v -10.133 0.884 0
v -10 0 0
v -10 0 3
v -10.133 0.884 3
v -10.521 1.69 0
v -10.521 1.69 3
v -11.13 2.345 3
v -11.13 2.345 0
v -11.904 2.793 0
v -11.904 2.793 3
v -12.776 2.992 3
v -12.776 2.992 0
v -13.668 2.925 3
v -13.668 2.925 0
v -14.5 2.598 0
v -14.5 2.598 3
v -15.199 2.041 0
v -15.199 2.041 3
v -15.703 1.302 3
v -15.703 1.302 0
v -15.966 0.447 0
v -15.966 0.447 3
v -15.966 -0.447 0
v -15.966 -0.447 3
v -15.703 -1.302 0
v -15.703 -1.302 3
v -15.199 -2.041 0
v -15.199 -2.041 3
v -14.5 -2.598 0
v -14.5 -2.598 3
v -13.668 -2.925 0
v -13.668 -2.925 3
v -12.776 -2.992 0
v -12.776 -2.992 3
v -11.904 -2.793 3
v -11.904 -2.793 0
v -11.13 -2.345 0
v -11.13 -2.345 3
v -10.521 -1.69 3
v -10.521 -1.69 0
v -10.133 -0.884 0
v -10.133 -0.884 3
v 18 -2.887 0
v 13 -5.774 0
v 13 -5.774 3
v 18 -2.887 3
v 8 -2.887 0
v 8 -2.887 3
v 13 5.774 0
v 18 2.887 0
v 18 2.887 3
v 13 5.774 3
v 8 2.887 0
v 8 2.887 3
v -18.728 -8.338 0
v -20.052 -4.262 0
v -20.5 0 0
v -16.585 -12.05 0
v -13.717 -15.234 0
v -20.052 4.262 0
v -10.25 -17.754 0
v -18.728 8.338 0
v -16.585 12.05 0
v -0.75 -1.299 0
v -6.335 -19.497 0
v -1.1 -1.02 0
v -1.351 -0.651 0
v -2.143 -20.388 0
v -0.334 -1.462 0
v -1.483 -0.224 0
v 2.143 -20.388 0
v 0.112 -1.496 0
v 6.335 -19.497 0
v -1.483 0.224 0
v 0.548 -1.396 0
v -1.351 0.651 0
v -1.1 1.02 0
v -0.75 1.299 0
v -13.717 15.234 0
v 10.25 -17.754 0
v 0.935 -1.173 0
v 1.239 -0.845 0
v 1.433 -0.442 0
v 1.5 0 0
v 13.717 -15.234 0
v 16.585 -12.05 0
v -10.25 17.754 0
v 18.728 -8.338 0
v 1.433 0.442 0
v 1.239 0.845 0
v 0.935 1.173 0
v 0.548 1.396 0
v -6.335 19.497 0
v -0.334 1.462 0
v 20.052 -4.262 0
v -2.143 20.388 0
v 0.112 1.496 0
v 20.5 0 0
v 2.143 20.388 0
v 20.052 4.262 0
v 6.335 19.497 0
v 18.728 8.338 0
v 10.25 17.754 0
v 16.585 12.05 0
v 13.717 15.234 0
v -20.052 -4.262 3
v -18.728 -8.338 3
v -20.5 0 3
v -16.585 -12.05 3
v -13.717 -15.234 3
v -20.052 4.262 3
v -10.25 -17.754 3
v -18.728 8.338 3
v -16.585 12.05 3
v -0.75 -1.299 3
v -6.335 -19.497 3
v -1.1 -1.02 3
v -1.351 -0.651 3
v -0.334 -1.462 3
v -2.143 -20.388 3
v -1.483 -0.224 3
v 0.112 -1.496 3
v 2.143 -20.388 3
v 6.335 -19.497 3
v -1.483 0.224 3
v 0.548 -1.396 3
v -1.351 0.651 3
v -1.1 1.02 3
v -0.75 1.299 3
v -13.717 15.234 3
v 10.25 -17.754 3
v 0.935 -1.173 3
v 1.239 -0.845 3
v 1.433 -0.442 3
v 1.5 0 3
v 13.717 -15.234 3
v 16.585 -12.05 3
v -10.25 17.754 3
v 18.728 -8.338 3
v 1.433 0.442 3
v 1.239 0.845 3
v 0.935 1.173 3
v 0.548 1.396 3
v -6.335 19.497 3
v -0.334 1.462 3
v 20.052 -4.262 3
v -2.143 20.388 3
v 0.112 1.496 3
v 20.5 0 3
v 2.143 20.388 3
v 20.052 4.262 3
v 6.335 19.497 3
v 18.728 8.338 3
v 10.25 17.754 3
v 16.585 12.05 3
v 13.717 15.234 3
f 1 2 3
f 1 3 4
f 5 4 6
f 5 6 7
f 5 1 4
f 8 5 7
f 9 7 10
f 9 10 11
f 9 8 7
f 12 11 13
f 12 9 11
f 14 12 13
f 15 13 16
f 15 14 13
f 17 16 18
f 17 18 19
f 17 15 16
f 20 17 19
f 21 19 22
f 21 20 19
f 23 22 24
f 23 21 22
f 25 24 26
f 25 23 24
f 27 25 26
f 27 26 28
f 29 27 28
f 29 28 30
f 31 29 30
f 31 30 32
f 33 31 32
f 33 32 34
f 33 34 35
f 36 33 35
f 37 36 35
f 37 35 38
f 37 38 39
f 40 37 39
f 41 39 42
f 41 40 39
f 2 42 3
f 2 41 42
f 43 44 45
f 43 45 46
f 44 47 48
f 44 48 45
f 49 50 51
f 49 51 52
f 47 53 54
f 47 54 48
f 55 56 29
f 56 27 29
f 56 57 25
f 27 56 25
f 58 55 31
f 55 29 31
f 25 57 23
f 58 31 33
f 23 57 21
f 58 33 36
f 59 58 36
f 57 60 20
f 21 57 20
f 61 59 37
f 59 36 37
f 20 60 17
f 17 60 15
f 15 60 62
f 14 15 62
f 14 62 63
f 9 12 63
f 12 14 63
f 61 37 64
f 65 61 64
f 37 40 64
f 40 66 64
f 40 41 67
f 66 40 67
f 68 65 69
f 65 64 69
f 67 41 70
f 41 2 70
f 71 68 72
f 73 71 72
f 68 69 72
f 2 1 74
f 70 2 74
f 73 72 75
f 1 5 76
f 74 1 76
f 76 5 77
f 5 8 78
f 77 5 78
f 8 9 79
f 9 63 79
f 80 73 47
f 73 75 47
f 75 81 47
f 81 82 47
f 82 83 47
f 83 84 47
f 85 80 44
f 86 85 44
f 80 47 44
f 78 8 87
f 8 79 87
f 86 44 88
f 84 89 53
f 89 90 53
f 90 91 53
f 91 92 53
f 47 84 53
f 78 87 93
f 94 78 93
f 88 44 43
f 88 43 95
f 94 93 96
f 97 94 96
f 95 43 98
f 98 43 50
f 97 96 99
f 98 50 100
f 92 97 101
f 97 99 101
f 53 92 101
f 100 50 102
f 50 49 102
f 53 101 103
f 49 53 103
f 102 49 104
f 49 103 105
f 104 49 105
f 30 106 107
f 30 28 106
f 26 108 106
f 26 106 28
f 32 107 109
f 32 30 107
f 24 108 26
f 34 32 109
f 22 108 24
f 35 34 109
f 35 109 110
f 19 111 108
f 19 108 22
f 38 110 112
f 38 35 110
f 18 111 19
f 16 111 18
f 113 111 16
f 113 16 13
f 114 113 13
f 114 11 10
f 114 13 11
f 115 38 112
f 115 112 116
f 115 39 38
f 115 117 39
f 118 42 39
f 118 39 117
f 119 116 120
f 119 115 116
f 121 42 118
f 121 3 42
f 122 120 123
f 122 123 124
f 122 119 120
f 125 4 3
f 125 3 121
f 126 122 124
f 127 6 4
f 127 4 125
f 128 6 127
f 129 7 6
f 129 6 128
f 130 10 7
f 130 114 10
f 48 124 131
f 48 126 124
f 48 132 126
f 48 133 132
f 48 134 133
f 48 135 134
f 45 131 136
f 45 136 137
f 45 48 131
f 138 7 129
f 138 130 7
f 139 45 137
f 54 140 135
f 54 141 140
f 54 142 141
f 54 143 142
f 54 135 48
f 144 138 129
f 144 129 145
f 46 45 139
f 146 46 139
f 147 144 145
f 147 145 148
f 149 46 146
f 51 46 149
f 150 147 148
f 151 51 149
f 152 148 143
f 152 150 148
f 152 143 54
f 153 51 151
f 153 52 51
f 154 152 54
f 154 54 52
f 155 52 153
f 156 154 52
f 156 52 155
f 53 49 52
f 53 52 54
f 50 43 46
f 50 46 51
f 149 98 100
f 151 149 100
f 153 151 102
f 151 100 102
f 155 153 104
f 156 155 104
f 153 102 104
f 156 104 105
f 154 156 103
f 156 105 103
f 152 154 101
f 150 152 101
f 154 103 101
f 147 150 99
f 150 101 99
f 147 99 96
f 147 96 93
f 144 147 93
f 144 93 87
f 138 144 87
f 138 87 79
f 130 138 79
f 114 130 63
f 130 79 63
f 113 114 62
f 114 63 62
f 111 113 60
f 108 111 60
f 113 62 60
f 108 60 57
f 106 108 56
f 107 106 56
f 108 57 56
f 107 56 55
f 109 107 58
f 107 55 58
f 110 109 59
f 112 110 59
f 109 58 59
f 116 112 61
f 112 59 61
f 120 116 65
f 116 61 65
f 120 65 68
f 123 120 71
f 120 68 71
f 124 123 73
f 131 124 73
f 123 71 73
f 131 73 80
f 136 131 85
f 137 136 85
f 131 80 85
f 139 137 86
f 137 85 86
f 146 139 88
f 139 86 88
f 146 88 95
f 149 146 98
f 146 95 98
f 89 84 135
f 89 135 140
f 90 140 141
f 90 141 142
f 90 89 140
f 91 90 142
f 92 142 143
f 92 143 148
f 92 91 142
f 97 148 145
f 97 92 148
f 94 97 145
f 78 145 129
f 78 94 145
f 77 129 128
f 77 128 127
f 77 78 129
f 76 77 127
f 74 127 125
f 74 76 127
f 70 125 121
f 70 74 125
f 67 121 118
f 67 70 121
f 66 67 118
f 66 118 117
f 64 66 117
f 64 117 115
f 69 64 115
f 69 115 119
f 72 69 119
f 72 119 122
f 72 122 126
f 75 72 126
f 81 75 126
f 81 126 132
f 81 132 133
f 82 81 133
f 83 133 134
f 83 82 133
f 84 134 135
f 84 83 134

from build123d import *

# Parameters (mm, degrees)
SKETCH1_R           = 20.5
SKETCH1_R_2         = 3
SKETCH1_R_3         = 1.5
BOSS_EXTRUDE1_DEPTH = 3


with BuildPart() as part:
    # Sketch1 → Boss-Extrude1 (new body)
    with BuildSketch(Plane.XY):
        Circle(SKETCH1_R)
        with Locations((-13, 0)):
            Circle(SKETCH1_R_2, mode=Mode.SUBTRACT)
        Circle(SKETCH1_R_3, mode=Mode.SUBTRACT)
        Polygon((18, 2.886751346), (13, 5.773502692), (8, 2.886751346), (8, -2.886751346), (13, -5.773502692), (18, -2.886751346), align=None, mode=Mode.SUBTRACT)
    extrude(amount=BOSS_EXTRUDE1_DEPTH)


solid = part.part
